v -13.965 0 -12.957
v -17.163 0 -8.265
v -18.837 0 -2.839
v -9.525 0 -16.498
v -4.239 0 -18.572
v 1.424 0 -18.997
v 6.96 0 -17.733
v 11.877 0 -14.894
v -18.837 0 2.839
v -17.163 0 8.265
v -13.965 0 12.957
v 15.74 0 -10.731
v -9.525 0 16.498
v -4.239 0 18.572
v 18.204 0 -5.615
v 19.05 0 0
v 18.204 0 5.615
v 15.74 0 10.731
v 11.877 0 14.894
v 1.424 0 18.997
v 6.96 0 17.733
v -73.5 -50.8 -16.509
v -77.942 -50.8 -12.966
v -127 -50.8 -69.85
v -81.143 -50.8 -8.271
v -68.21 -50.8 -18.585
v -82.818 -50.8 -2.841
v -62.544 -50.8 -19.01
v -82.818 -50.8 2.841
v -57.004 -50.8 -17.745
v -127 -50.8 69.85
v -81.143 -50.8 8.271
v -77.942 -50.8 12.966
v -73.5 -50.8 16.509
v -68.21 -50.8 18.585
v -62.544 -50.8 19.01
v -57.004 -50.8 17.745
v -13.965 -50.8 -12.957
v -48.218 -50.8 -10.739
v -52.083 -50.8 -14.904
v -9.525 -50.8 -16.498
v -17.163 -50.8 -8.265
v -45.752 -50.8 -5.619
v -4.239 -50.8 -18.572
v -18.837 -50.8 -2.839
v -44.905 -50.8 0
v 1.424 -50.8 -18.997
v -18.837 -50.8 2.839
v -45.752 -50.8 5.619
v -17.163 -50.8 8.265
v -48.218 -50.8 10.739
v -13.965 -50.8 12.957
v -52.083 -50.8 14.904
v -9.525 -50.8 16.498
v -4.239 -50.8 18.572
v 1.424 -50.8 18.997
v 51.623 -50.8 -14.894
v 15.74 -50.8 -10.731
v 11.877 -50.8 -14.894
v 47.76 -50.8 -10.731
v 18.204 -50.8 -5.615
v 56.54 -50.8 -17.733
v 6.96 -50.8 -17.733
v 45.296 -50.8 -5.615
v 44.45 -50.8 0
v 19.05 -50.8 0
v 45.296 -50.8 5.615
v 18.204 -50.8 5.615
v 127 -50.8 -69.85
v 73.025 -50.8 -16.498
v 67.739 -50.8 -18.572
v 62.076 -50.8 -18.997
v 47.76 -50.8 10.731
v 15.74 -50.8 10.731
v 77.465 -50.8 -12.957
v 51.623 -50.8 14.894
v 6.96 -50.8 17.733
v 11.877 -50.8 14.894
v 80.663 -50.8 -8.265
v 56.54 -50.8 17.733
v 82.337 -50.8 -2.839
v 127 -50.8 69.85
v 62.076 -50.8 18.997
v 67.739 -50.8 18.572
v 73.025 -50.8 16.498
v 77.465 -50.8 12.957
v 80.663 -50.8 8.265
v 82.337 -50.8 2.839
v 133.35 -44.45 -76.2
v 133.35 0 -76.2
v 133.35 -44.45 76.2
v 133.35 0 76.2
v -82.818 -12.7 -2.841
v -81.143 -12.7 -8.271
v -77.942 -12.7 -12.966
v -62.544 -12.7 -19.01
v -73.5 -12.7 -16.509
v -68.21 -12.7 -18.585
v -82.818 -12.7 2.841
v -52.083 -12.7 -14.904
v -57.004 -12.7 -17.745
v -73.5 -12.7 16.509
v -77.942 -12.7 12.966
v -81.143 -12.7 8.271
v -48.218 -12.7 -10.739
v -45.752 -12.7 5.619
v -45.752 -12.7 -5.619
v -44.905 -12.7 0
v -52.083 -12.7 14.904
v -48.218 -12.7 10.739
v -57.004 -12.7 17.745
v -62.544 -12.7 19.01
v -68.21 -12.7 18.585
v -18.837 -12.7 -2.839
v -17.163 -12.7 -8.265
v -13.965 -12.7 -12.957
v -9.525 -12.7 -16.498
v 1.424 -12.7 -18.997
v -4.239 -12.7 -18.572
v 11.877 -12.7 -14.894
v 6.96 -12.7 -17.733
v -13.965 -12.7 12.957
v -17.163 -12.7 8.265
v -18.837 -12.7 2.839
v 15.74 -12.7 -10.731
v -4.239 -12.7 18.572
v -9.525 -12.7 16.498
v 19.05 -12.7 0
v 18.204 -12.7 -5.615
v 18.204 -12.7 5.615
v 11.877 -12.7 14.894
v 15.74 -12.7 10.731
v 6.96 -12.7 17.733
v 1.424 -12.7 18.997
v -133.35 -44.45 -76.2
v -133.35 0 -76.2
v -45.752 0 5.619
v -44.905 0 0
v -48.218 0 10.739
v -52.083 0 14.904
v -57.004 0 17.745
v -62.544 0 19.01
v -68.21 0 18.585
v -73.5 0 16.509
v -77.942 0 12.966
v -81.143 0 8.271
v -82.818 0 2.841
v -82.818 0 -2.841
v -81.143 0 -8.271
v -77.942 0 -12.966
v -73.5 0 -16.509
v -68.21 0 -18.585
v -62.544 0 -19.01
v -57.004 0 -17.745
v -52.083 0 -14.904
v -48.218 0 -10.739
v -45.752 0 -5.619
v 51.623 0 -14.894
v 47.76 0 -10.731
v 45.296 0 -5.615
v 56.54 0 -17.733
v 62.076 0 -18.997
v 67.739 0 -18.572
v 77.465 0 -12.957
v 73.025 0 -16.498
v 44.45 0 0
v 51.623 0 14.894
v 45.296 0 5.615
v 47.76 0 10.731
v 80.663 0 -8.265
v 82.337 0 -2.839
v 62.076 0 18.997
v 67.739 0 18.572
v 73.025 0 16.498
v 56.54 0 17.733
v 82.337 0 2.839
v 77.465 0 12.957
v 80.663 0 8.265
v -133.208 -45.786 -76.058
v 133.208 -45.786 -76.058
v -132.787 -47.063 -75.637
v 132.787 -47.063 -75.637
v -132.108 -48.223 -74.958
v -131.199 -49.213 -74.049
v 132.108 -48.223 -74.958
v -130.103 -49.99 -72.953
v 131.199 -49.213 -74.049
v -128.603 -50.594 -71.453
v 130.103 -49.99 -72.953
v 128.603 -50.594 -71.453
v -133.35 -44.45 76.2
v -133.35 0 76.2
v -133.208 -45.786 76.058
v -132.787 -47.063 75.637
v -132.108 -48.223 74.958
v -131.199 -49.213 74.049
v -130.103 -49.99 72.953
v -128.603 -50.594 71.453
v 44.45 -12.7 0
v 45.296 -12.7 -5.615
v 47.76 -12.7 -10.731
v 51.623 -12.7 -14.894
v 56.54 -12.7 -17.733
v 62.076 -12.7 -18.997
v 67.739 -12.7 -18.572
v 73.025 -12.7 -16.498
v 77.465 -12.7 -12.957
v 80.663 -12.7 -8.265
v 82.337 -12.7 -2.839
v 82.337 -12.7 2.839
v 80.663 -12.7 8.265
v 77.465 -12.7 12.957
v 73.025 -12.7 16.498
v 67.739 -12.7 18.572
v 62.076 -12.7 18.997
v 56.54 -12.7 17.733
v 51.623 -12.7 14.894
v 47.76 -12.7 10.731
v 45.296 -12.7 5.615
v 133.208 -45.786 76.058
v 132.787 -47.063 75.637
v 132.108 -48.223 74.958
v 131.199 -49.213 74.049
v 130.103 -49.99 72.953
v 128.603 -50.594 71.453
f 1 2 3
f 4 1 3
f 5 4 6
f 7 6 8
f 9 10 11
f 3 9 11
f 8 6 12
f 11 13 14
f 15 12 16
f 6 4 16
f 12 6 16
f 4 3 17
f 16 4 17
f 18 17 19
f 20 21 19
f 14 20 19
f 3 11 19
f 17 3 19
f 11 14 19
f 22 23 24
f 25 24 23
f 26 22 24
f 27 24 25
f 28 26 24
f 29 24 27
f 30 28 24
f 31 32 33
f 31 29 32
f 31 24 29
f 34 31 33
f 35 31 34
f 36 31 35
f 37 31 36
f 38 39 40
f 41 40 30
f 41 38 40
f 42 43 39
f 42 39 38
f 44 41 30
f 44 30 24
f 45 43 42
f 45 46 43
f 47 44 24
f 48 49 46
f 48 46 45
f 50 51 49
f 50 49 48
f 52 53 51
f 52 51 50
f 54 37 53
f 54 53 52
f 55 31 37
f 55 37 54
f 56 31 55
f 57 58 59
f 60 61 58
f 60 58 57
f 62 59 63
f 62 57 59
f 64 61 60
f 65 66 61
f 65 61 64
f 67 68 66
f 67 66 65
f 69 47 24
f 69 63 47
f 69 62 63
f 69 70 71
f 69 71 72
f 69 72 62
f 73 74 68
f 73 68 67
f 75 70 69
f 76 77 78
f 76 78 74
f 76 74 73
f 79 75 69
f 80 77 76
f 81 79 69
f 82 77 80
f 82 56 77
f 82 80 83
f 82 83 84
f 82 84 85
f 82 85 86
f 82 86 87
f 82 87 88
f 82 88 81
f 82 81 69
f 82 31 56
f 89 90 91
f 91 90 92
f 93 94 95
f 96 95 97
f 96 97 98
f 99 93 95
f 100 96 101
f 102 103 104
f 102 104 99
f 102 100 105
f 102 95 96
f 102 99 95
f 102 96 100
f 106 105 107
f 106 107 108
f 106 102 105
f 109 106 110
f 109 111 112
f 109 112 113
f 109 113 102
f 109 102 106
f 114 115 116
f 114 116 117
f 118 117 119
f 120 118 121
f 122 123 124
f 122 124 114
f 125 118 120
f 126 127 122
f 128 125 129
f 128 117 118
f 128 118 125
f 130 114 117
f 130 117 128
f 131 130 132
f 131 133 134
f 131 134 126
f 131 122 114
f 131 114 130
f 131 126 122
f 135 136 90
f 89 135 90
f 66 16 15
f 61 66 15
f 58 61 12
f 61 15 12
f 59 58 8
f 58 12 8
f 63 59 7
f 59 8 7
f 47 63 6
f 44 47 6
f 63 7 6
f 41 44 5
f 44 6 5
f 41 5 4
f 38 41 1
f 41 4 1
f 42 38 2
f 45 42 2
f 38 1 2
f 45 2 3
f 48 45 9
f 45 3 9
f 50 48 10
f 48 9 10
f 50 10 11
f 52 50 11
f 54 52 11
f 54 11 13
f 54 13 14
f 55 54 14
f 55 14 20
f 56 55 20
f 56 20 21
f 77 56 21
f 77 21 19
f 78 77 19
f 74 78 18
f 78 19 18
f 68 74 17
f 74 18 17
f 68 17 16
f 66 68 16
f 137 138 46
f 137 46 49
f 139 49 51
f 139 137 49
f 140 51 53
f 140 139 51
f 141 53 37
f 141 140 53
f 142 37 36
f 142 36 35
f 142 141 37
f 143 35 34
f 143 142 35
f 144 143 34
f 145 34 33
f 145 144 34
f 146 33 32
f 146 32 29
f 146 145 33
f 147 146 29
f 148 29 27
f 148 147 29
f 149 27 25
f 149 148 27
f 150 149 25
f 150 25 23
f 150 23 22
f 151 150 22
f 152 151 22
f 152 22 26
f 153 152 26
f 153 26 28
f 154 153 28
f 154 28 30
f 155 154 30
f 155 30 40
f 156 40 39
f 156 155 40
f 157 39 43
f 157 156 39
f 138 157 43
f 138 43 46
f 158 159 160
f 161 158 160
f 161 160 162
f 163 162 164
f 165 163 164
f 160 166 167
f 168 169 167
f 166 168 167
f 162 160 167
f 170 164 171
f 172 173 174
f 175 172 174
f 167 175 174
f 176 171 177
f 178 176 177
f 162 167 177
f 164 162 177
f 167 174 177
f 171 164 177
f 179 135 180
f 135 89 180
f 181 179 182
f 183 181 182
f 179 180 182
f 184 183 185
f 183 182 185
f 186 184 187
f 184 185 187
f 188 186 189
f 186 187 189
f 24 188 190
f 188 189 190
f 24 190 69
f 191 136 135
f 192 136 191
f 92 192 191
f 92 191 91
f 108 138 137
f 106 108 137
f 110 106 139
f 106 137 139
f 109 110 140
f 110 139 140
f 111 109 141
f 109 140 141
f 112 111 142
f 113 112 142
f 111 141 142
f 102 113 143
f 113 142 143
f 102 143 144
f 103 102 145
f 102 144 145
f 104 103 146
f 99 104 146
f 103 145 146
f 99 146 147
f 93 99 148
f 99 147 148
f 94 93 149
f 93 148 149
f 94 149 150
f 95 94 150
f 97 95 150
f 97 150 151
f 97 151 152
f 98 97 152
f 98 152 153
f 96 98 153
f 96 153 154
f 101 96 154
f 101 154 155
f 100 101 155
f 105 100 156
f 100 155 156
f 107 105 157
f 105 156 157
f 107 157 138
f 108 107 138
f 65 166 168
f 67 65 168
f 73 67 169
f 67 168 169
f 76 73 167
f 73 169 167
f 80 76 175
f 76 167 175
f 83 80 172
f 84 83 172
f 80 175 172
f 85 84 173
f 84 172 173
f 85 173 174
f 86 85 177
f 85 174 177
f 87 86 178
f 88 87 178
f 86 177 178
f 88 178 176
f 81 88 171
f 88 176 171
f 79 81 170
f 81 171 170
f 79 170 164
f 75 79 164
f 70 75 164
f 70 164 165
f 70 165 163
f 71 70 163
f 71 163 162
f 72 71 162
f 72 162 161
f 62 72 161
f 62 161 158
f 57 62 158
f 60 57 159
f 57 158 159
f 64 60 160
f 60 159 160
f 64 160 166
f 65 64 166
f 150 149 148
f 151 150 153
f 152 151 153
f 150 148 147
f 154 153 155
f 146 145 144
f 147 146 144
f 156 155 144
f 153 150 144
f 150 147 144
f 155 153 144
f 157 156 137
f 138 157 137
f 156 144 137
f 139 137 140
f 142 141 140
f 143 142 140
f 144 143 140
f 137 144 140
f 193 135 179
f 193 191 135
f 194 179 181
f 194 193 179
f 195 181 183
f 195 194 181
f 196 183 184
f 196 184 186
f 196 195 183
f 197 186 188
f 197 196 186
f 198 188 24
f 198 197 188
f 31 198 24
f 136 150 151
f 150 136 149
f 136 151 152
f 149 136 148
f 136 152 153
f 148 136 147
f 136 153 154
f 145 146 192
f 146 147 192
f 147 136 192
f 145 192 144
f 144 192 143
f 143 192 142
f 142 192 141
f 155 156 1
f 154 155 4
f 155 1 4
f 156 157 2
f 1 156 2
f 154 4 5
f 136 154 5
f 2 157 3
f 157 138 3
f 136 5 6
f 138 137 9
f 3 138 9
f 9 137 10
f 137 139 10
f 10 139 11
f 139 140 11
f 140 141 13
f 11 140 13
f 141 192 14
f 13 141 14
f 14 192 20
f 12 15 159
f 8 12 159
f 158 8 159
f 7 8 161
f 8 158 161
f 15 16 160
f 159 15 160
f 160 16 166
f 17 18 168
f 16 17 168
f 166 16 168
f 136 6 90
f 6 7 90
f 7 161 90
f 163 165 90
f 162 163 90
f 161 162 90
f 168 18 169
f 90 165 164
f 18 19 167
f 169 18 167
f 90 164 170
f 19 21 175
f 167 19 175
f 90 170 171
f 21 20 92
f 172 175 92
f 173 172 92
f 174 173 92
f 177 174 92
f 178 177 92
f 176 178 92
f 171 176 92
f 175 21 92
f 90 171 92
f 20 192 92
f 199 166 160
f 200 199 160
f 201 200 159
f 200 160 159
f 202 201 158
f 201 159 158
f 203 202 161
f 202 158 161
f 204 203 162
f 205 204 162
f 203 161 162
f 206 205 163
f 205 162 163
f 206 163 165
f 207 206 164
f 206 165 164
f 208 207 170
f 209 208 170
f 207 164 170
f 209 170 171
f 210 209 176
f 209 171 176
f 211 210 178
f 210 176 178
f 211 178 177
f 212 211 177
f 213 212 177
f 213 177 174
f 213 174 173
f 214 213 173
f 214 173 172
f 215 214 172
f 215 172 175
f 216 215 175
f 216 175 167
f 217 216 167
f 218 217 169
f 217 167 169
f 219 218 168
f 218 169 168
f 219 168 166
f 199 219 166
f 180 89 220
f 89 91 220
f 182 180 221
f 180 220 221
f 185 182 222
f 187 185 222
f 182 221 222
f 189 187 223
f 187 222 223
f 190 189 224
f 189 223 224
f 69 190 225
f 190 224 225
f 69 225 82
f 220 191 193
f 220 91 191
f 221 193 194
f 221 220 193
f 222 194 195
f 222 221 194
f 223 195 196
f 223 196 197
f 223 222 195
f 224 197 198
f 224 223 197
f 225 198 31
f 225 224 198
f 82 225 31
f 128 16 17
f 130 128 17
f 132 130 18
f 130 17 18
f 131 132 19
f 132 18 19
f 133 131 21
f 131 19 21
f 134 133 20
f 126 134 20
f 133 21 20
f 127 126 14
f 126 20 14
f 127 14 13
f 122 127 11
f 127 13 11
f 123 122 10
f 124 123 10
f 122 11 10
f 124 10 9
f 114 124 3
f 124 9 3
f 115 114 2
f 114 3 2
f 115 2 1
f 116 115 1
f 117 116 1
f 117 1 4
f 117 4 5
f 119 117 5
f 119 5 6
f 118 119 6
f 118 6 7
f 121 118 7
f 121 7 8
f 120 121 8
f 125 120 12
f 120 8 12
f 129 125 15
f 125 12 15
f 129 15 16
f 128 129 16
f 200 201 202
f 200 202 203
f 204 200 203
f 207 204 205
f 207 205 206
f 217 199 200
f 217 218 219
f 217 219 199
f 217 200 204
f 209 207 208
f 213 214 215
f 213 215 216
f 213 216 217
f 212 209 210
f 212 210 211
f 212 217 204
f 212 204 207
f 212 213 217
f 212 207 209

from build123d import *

# Parameters (mm, degrees)
F0_W     = 266.7
F0_H     = 152.4
F0_R     = 19.0629117812
F1_DEPTH = 50.8
F2_DEPTH = 12.7
F3_R     = 6.35


with BuildPart() as f1:
    # F0 (on Front) → F1 (new body)
    with BuildSketch(Plane.XZ):
        Rectangle(F0_W, F0_H)
        with Locations((-63.9682784677, 0)):
            Circle(F0_R, mode=Mode.SUBTRACT)
        with BuildLine():
            ThreePointArc((-19.05, 0), (0, 19.05), (19.05, 0))
            ThreePointArc((19.05, 0), (0, -19.05), (-19.05, 0))
        make_face(mode=Mode.SUBTRACT)
        with BuildLine():
            ThreePointArc((82.55, 0), (63.5, -19.05), (44.45, 0))
            ThreePointArc((44.45, 0), (63.5, 19.05), (82.55, 0))
        make_face(mode=Mode.SUBTRACT)
    extrude(amount=F1_DEPTH)

    # F3
    f3_edges = [f1.edges().sort_by_distance(p)[0] for p in [
        (0, -50.8, 76.2),
        (-133.35, -50.8, 0),
        (133.35, -50.8, 0),
        (0, -50.8, -76.2),
    ]]
    fillet(f3_edges, radius=F3_R)


with BuildPart() as f2:
    # F0 (on Front) → F2 (new body)
    with BuildSketch(Plane.XZ):
        with BuildLine():
            ThreePointArc((-19.05, 0), (0, -19.05), (19.05, 0))
            ThreePointArc((19.05, 0), (0, 19.05), (-19.05, 0))
        make_face()
    extrude(amount=F2_DEPTH)


with BuildPart() as f2b:
    # F0 (on Front) → F2, piece 2 (new body)
    with BuildSketch(Plane.XZ):
        with BuildLine():
            ThreePointArc((82.55, 0), (63.5, 19.05), (44.45, 0))
            ThreePointArc((44.45, 0), (63.5, -19.05), (82.55, 0))
        make_face()
    extrude(amount=F2_DEPTH)


with BuildPart() as f2c:
    # F0 (on Front) → F2, piece 3 (new body)
    with BuildSketch(Plane.XZ):
        with Locations((-63.9682784677, 0)):
            Circle(F0_R)
    extrude(amount=F2_DEPTH)


solid = Compound([f1.part, f2.part, f2b.part, f2c.part])
